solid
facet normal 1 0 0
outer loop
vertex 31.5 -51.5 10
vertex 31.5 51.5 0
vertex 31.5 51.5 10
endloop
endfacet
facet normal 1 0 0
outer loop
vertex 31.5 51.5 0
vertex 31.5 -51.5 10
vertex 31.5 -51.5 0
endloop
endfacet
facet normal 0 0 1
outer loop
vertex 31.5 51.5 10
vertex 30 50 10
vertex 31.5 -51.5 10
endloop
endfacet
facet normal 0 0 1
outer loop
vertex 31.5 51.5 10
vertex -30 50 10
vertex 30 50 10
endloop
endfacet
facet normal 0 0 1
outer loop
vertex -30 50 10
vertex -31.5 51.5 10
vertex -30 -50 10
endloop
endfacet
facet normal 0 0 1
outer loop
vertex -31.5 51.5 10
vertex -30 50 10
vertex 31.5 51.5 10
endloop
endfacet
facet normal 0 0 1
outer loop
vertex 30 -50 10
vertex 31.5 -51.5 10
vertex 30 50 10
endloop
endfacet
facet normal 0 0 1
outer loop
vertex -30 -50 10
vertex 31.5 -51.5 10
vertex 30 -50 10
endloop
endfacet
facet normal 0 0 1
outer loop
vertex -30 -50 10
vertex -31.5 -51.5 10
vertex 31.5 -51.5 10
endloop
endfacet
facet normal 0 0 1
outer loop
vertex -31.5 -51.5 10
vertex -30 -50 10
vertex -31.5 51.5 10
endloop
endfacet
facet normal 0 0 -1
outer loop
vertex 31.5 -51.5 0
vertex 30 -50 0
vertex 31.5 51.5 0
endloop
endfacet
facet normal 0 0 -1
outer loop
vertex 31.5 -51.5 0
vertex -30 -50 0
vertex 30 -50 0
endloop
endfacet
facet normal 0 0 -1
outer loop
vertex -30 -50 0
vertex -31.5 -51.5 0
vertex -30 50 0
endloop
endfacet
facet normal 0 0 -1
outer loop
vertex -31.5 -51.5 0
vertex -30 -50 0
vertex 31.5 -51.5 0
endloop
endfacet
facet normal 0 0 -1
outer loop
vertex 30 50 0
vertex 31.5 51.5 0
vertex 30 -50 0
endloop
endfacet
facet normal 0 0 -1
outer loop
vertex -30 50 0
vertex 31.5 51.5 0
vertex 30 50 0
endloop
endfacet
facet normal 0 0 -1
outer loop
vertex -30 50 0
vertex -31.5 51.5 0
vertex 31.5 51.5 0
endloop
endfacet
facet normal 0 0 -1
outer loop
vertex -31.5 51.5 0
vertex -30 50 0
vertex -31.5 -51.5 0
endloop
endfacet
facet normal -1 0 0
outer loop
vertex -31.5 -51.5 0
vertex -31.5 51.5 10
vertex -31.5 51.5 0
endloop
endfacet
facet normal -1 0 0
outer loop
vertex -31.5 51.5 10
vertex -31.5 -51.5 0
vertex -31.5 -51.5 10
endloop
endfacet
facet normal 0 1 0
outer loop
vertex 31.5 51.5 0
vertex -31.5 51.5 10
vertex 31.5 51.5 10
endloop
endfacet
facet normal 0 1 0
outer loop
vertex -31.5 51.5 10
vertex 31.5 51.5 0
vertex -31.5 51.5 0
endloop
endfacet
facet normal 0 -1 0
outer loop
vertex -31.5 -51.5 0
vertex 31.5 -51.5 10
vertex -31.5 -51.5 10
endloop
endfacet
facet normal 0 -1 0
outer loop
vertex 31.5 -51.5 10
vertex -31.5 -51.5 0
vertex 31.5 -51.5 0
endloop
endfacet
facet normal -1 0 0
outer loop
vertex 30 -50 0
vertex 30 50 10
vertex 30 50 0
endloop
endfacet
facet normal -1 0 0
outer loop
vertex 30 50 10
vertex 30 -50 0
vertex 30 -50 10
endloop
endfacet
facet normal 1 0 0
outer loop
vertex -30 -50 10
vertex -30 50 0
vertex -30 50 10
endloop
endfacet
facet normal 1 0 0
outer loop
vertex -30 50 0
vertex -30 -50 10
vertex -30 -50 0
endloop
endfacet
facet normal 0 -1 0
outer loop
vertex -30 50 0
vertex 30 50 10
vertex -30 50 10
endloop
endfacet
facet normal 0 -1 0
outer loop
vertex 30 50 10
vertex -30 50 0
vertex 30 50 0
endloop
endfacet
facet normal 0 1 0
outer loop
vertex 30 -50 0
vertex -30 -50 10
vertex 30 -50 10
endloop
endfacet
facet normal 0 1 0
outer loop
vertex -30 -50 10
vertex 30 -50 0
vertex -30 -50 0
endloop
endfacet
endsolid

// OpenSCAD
//size of the finished case
case_w = 60;
case_l = 100;
case_h = 10;
wall_thickness=1.5;

//width of the dxf is set by potrace
pattern_w=100;
pattern_l=pattern_w*1.33; //aspect ratio
pattern_thickness=1;

//xshift and yshift move the fingerprint about
xshift = 0;
yshift = 0;
//zoom, zooms...
zoom = 1;

//create the border
border();

//import the fingerprint dxf
*import_shape();
//subtract all the stuff we don't want
back();


module import_shape()
{
    translate([xshift,yshift,0])
        scale([zoom,zoom,0])
            translate([-pattern_w/2,-pattern_l/2,0])
                linear_extrude(height=pattern_thickness)
                   import("fingerprint.dxf") ;
}

module case_clipping()
{
    translate([0,0,pattern_thickness/2])
    difference()
    {
        cube([case_w*4,case_l*4,pattern_thickness*2],center=true);
        cube([case_w,case_l,pattern_thickness*4],center=true);
    }

}

module back()
{
    difference()
    {
        import_shape();
        case_clipping();
    }
}

module border()
{
    translate([0,0,case_h/2])
    difference()
    {
        cube([case_w+2*wall_thickness,case_l+2*wall_thickness,case_h],center=true);
        cube([case_w,case_l,case_h*2],center=true);
    }

}
